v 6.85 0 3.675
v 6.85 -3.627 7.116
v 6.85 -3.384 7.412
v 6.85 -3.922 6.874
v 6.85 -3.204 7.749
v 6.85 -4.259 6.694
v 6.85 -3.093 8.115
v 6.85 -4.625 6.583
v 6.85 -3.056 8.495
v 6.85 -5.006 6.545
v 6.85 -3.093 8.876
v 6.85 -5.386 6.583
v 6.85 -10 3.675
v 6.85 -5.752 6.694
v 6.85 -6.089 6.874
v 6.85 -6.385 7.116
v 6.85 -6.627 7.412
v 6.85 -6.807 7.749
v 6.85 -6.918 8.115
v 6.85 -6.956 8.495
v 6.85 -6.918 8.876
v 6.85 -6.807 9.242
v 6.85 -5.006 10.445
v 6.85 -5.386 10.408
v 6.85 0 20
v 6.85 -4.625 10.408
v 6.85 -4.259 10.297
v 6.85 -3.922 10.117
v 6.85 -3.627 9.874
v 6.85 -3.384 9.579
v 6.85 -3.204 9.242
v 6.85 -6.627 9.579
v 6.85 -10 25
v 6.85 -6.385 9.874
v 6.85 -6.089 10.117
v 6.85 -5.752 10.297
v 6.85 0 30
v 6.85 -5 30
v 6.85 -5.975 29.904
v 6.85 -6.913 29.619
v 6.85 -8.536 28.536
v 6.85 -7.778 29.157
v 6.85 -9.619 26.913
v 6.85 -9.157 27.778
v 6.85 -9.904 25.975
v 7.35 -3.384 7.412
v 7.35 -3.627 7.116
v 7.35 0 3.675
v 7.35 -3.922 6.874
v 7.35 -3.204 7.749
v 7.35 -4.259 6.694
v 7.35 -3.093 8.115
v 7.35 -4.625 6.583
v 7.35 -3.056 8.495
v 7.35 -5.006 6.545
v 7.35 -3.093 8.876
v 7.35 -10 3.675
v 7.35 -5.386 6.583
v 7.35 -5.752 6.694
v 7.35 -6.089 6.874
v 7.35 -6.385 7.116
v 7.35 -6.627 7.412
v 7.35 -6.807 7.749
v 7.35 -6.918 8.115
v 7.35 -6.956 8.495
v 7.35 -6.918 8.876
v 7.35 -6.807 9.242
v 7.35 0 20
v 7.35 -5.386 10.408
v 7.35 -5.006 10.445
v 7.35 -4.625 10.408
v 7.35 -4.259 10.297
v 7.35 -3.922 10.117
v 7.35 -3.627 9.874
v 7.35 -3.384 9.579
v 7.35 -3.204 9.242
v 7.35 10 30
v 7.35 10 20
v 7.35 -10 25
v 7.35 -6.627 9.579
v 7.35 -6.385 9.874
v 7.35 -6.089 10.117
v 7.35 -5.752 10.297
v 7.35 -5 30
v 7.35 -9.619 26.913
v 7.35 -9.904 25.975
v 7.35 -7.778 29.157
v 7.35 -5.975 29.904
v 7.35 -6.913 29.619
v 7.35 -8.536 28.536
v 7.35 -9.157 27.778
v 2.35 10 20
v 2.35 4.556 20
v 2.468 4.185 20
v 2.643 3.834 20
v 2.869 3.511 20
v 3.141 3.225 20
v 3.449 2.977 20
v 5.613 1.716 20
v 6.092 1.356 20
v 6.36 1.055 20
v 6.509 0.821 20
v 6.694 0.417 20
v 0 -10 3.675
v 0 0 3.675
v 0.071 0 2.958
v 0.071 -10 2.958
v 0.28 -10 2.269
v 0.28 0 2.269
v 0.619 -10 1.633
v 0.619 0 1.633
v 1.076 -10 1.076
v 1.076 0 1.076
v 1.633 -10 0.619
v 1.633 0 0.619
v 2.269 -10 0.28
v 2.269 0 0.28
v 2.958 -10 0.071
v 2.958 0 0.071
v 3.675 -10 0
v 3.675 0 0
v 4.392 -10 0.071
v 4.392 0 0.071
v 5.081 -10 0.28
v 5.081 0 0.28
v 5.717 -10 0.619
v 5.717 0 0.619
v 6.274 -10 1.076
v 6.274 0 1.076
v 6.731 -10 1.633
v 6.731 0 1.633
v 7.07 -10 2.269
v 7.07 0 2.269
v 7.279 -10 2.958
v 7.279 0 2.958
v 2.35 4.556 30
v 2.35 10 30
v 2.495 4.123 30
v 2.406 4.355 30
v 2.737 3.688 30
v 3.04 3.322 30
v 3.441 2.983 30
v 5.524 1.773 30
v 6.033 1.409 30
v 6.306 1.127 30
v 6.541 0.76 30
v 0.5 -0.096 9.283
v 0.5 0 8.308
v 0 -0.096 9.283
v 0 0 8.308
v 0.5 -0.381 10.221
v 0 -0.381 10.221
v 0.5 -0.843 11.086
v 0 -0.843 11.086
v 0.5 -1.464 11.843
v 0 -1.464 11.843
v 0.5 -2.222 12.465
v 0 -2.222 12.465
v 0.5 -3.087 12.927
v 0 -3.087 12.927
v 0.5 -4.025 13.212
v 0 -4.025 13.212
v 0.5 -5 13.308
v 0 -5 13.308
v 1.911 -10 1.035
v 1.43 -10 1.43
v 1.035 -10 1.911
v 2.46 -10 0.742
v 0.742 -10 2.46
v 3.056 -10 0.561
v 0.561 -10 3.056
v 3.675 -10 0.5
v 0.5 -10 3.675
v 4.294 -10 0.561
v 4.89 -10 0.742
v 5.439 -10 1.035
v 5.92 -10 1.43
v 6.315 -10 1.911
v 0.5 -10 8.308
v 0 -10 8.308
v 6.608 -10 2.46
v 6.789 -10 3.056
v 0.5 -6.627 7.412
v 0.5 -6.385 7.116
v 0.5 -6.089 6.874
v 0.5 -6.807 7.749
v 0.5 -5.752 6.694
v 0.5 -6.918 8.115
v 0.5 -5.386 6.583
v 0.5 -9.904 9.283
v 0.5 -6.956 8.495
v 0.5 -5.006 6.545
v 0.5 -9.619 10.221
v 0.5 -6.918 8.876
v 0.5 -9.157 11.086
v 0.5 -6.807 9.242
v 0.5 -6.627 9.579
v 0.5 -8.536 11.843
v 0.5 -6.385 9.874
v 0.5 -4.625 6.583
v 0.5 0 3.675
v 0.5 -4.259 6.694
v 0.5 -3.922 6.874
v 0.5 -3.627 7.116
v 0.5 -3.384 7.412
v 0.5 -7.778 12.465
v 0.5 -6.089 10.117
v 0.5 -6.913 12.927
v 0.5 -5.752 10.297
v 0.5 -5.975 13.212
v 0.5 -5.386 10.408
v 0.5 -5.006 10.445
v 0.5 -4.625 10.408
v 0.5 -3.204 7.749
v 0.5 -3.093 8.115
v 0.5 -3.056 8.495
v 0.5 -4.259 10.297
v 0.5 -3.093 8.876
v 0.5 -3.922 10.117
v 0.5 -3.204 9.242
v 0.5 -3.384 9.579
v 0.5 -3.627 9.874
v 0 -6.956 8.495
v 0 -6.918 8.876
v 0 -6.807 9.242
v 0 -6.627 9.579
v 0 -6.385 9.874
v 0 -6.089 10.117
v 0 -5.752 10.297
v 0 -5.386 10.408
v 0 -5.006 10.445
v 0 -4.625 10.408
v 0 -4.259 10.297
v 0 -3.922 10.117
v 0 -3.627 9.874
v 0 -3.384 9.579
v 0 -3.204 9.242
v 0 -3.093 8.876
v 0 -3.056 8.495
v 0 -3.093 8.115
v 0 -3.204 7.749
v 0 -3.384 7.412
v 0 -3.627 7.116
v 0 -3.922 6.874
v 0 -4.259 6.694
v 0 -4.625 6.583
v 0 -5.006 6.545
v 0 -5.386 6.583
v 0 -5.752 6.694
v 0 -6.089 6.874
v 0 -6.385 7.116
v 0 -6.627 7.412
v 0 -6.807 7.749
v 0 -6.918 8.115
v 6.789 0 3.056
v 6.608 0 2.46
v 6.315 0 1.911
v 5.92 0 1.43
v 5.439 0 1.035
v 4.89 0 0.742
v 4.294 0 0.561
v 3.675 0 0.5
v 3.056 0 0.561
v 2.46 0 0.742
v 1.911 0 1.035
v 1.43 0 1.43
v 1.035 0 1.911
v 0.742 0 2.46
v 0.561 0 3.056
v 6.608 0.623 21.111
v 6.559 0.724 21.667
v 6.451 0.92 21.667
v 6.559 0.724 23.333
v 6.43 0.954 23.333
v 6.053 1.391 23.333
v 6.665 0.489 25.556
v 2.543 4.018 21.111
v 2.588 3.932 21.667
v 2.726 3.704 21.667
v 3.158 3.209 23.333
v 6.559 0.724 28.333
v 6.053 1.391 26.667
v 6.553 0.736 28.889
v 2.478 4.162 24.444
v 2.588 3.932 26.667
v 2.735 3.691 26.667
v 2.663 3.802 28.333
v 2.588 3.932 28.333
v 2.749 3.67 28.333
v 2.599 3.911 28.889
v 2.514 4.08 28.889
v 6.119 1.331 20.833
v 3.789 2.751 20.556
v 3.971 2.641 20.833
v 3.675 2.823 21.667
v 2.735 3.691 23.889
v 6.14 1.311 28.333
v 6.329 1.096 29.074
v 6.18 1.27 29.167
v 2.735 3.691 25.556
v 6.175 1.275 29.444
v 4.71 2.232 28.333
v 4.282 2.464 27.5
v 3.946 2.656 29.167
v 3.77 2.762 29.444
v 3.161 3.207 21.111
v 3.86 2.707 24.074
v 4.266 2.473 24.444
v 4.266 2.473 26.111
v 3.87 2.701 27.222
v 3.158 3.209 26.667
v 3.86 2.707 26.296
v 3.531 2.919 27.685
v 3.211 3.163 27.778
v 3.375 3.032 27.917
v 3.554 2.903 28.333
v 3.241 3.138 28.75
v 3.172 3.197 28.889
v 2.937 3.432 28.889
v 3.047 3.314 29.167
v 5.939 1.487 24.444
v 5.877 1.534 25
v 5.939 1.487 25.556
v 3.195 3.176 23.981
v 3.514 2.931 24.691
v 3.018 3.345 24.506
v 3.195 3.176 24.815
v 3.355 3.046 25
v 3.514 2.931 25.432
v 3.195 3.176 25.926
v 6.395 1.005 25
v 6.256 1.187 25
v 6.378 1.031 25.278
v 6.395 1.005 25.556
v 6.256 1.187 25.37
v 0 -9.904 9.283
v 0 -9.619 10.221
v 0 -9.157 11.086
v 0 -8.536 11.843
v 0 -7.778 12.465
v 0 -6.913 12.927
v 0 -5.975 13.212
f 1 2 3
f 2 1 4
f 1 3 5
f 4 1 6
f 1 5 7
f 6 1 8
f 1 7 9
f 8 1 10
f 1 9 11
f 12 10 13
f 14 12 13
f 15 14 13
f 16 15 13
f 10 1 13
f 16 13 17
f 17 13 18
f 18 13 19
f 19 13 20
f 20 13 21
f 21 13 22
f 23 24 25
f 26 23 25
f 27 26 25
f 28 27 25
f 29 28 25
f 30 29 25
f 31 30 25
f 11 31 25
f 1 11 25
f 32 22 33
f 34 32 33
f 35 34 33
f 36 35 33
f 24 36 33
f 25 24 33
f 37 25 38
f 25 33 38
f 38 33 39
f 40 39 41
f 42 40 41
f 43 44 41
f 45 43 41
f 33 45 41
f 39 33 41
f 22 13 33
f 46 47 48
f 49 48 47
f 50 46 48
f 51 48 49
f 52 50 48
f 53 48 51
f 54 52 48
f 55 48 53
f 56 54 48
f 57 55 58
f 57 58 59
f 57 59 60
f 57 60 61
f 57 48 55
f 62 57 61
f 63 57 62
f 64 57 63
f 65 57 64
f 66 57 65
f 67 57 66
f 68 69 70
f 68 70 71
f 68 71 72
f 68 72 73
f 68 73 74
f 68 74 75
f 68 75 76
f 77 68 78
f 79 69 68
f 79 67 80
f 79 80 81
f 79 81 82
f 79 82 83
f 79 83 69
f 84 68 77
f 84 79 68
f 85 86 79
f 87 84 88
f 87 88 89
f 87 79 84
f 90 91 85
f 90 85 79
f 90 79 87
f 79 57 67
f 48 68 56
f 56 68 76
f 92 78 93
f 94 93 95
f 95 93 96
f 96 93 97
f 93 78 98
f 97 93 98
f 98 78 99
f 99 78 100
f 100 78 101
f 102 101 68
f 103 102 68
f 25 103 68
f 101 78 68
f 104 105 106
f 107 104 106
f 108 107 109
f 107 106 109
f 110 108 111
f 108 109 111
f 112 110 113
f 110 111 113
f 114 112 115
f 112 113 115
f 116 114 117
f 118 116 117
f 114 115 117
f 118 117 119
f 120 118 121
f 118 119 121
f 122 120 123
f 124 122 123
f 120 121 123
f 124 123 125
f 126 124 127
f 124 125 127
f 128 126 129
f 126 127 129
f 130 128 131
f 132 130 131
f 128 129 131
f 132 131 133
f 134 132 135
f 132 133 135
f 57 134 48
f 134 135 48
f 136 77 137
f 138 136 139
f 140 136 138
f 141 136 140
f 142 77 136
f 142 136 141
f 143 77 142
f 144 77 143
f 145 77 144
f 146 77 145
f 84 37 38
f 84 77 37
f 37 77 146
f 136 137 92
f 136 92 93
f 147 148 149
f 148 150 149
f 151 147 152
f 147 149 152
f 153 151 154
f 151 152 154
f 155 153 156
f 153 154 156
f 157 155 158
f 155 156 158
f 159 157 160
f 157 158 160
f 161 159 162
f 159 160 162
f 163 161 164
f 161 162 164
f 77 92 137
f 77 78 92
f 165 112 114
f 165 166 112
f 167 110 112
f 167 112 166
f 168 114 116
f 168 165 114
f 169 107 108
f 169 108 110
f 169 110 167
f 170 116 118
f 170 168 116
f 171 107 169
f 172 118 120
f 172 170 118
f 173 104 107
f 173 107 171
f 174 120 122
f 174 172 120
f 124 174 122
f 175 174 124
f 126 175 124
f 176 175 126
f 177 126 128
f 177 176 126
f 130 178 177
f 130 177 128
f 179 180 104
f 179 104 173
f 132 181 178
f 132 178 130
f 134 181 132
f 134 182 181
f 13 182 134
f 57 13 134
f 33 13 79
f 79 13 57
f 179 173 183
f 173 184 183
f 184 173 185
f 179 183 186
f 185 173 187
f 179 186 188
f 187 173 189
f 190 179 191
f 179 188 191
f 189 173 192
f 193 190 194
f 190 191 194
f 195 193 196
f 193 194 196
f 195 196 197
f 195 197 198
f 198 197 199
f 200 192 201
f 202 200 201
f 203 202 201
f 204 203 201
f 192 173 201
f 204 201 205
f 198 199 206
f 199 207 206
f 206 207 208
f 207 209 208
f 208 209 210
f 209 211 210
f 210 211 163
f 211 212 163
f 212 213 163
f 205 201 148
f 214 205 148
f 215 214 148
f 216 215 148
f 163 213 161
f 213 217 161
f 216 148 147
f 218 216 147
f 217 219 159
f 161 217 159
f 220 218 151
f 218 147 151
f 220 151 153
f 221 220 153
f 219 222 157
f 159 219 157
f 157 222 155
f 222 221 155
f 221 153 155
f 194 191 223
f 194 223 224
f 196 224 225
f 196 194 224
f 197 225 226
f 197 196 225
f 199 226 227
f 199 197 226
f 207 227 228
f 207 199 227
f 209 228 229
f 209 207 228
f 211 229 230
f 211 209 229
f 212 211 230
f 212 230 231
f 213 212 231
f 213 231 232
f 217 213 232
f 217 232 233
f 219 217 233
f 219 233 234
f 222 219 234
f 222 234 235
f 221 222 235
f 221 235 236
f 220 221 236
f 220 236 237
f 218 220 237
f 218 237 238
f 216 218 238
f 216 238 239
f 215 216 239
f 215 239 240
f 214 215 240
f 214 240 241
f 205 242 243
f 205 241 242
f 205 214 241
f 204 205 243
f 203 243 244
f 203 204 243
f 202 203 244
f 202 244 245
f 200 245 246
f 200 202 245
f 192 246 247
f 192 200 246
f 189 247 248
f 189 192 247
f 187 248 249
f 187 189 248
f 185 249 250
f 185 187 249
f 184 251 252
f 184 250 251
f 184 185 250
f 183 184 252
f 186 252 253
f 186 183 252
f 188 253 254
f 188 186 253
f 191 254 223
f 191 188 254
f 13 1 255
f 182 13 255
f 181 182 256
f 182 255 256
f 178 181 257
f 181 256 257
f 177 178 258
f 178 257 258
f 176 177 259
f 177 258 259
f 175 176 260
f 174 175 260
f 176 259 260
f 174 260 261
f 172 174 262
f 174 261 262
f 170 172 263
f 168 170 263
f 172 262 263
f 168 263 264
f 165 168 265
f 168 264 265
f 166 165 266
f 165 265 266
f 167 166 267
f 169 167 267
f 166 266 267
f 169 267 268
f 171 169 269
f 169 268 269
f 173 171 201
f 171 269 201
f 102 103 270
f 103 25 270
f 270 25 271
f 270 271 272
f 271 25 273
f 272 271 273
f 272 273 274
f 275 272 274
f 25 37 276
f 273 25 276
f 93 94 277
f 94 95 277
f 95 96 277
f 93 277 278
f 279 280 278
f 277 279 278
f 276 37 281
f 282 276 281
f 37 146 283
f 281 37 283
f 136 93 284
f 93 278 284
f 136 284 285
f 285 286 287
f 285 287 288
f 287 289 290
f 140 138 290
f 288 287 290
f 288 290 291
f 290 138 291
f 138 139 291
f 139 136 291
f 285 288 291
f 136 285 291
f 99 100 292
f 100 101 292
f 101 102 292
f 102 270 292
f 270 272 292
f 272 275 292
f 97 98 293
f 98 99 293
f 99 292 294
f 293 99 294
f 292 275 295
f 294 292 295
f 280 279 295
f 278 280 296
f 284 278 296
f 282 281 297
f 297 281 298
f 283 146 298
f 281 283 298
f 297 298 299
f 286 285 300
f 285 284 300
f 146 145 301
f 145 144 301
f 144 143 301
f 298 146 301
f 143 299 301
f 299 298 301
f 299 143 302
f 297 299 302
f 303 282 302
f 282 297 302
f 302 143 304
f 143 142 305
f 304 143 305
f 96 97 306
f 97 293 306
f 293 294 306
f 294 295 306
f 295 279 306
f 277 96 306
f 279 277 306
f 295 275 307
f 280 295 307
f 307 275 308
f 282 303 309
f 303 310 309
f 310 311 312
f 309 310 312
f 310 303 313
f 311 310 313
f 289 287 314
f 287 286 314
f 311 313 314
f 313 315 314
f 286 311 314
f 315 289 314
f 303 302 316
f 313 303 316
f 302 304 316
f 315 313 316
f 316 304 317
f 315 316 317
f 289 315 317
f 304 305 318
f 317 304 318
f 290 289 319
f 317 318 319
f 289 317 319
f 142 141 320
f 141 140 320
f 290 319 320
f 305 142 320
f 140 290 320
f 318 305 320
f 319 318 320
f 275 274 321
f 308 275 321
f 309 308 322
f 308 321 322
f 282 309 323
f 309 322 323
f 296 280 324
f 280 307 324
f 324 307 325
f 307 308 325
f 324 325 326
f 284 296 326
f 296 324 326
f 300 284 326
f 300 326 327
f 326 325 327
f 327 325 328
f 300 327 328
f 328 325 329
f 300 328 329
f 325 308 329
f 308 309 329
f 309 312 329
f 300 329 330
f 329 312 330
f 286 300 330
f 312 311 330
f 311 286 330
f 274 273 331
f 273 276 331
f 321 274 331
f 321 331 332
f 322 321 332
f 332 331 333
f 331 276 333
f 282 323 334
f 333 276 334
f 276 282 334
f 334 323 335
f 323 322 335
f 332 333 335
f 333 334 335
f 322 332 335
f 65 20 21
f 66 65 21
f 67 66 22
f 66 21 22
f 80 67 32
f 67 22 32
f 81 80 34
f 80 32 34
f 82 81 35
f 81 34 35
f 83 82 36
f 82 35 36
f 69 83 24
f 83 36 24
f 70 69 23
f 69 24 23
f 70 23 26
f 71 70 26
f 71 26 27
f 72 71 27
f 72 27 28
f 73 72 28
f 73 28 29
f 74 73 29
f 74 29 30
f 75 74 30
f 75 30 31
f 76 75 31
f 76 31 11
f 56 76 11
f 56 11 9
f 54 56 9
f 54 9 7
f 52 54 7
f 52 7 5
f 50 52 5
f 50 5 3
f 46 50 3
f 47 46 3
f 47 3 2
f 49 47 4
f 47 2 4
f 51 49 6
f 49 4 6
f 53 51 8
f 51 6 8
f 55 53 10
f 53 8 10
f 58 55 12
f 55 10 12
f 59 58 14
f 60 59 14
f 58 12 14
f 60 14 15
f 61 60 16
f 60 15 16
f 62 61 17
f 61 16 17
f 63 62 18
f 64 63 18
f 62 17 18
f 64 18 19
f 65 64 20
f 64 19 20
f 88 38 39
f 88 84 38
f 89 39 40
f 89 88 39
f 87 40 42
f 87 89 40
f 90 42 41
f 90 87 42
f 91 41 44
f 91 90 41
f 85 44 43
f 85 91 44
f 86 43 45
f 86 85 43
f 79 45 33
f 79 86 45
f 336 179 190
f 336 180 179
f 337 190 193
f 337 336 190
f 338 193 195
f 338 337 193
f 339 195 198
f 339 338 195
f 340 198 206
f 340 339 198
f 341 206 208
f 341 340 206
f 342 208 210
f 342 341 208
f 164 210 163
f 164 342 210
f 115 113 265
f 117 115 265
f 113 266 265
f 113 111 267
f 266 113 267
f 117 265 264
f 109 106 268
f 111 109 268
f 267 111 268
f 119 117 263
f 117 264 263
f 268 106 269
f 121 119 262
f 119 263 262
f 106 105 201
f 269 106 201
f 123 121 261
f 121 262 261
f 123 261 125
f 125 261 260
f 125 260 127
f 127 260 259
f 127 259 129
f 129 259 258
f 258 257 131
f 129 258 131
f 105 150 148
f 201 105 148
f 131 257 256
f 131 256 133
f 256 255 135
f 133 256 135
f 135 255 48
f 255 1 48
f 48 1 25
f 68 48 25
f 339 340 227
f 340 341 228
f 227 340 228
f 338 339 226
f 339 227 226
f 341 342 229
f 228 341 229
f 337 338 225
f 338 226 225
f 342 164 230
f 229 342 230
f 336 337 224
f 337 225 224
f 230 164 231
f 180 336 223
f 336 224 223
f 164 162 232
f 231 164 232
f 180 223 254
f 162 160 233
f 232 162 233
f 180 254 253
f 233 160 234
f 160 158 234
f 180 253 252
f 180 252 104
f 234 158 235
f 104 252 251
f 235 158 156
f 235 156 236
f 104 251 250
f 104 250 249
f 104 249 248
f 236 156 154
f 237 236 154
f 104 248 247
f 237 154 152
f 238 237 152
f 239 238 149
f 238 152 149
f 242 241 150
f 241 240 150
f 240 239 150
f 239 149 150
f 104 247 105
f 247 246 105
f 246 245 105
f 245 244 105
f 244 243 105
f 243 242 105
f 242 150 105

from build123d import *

# Parameters (mm, degrees)
F1_DEPTH  = 10
F0_W      = 0.5
F0_H      = 10
F2_DEPTH  = 10
F3_DEPTH  = 10
F4_R      = 1.95
F5_DEPTH  = 25
F6_DEPTH  = 25
F7_R      = 4.99999
F4_W      = 10
F4_H      = 10
F8_DEPTH  = 4.5
F10_DEPTH = 25


# Not quite as in the source:
# - a fillet or chamfer is up to 0.001 mm smaller than in the source, because OpenCascade refuses the exact size


with BuildPart() as f1:
    # F0 (on Front) → F1 (new body)
    with BuildSketch(Plane.XZ):
        with BuildLine():
            Line((0.5, 3.675), (0, 3.675))
            ThreePointArc((0, 3.675), (3.675, 0), (7.35, 3.675))
            Line((7.35, 3.675), (7.35, 20))
            Line((7.35, 20), (6.85, 20))
            Line((6.85, 20), (6.85, 3.675))
            ThreePointArc((6.85, 3.675), (3.675, 0.5), (0.5, 3.675))
        make_face()
        Polygon((0, 11.5236516859), (0, 3.675), (0.5, 3.675), (0.5, 13.3078707406), (0, 13.3078707406), align=None)
    extrude(amount=F1_DEPTH)

    # F0 (on Front) → F2 (join)
    with BuildSketch(Plane.XZ):
        with Locations((7.1, 25)):
            Rectangle(F0_W, F0_H)
    extrude(amount=F2_DEPTH)

    # F0 (on Front) → F3 (join)
    with BuildSketch(Plane.XZ):
        with Locations((7.1, 25)):
            Rectangle(F0_W, F0_H)
    extrude(amount=-F3_DEPTH)

    # F4 (on face) → F5 (cut)
    with BuildSketch(Plane(origin=(6.85, 0, 0), x_dir=(0, -1, 0), z_dir=(-1, 0, 0))):
        with Locations((5.0057064388, 8.4952701442)):
            Circle(F4_R)
    extrude(amount=-F5_DEPTH, mode=Mode.SUBTRACT)

    # F4 (on face) → F6 (cut)
    with BuildSketch(Plane(origin=(6.85, 0, 0), x_dir=(0, -1, 0), z_dir=(-1, 0, 0))):
        with Locations((5.0057064388, 8.4952701442)):
            Circle(F4_R)
    extrude(amount=F6_DEPTH, mode=Mode.SUBTRACT)

    # F7 (radius 5 in the source; OpenCascade refuses exactly that, so slightly less here)
    f7_edges = [f1.edges().sort_by_distance(p)[0] for p in [
        (7.1, -10, 30),
        (0.25, -10, 13.307871),
        (0.25, 0, 13.307871),
    ]]
    fillet(f7_edges, radius=F7_R)

    # F4 (on face) → F8 (join)
    with BuildSketch(Plane(origin=(6.85, 0, 0), x_dir=(0, -1, 0), z_dir=(-1, 0, 0))):
        with Locations((-5, 25)):
            Rectangle(F4_W, F4_H)
    extrude(amount=F8_DEPTH)

    # F9 (on face) → F10 (cut)
    with BuildSketch(Plane.XY.offset(30)):
        with BuildLine():
            Line((2.35, 0), (6.85, 0))
            add(Edge.make_bspline(
                [(6.85, 0), (6.6607907806, 0.4988620131), (6.3387521568, 1.6560182736), (2.9528697619, 2.8701009159), (2.4258734683, 4.2211432066), (2.35, 4.5559741557)],
                knots=[0, 0, 0, 0, 0.2515030108, 0.6187434404, 0.8676489933, 0.8676489933, 0.8676489933, 0.8676489933], degree=3))
            Line((2.35, 4.5559741557), (2.35, 0))
        make_face()
    extrude(amount=-F10_DEPTH, mode=Mode.SUBTRACT)


solid = f1.part
